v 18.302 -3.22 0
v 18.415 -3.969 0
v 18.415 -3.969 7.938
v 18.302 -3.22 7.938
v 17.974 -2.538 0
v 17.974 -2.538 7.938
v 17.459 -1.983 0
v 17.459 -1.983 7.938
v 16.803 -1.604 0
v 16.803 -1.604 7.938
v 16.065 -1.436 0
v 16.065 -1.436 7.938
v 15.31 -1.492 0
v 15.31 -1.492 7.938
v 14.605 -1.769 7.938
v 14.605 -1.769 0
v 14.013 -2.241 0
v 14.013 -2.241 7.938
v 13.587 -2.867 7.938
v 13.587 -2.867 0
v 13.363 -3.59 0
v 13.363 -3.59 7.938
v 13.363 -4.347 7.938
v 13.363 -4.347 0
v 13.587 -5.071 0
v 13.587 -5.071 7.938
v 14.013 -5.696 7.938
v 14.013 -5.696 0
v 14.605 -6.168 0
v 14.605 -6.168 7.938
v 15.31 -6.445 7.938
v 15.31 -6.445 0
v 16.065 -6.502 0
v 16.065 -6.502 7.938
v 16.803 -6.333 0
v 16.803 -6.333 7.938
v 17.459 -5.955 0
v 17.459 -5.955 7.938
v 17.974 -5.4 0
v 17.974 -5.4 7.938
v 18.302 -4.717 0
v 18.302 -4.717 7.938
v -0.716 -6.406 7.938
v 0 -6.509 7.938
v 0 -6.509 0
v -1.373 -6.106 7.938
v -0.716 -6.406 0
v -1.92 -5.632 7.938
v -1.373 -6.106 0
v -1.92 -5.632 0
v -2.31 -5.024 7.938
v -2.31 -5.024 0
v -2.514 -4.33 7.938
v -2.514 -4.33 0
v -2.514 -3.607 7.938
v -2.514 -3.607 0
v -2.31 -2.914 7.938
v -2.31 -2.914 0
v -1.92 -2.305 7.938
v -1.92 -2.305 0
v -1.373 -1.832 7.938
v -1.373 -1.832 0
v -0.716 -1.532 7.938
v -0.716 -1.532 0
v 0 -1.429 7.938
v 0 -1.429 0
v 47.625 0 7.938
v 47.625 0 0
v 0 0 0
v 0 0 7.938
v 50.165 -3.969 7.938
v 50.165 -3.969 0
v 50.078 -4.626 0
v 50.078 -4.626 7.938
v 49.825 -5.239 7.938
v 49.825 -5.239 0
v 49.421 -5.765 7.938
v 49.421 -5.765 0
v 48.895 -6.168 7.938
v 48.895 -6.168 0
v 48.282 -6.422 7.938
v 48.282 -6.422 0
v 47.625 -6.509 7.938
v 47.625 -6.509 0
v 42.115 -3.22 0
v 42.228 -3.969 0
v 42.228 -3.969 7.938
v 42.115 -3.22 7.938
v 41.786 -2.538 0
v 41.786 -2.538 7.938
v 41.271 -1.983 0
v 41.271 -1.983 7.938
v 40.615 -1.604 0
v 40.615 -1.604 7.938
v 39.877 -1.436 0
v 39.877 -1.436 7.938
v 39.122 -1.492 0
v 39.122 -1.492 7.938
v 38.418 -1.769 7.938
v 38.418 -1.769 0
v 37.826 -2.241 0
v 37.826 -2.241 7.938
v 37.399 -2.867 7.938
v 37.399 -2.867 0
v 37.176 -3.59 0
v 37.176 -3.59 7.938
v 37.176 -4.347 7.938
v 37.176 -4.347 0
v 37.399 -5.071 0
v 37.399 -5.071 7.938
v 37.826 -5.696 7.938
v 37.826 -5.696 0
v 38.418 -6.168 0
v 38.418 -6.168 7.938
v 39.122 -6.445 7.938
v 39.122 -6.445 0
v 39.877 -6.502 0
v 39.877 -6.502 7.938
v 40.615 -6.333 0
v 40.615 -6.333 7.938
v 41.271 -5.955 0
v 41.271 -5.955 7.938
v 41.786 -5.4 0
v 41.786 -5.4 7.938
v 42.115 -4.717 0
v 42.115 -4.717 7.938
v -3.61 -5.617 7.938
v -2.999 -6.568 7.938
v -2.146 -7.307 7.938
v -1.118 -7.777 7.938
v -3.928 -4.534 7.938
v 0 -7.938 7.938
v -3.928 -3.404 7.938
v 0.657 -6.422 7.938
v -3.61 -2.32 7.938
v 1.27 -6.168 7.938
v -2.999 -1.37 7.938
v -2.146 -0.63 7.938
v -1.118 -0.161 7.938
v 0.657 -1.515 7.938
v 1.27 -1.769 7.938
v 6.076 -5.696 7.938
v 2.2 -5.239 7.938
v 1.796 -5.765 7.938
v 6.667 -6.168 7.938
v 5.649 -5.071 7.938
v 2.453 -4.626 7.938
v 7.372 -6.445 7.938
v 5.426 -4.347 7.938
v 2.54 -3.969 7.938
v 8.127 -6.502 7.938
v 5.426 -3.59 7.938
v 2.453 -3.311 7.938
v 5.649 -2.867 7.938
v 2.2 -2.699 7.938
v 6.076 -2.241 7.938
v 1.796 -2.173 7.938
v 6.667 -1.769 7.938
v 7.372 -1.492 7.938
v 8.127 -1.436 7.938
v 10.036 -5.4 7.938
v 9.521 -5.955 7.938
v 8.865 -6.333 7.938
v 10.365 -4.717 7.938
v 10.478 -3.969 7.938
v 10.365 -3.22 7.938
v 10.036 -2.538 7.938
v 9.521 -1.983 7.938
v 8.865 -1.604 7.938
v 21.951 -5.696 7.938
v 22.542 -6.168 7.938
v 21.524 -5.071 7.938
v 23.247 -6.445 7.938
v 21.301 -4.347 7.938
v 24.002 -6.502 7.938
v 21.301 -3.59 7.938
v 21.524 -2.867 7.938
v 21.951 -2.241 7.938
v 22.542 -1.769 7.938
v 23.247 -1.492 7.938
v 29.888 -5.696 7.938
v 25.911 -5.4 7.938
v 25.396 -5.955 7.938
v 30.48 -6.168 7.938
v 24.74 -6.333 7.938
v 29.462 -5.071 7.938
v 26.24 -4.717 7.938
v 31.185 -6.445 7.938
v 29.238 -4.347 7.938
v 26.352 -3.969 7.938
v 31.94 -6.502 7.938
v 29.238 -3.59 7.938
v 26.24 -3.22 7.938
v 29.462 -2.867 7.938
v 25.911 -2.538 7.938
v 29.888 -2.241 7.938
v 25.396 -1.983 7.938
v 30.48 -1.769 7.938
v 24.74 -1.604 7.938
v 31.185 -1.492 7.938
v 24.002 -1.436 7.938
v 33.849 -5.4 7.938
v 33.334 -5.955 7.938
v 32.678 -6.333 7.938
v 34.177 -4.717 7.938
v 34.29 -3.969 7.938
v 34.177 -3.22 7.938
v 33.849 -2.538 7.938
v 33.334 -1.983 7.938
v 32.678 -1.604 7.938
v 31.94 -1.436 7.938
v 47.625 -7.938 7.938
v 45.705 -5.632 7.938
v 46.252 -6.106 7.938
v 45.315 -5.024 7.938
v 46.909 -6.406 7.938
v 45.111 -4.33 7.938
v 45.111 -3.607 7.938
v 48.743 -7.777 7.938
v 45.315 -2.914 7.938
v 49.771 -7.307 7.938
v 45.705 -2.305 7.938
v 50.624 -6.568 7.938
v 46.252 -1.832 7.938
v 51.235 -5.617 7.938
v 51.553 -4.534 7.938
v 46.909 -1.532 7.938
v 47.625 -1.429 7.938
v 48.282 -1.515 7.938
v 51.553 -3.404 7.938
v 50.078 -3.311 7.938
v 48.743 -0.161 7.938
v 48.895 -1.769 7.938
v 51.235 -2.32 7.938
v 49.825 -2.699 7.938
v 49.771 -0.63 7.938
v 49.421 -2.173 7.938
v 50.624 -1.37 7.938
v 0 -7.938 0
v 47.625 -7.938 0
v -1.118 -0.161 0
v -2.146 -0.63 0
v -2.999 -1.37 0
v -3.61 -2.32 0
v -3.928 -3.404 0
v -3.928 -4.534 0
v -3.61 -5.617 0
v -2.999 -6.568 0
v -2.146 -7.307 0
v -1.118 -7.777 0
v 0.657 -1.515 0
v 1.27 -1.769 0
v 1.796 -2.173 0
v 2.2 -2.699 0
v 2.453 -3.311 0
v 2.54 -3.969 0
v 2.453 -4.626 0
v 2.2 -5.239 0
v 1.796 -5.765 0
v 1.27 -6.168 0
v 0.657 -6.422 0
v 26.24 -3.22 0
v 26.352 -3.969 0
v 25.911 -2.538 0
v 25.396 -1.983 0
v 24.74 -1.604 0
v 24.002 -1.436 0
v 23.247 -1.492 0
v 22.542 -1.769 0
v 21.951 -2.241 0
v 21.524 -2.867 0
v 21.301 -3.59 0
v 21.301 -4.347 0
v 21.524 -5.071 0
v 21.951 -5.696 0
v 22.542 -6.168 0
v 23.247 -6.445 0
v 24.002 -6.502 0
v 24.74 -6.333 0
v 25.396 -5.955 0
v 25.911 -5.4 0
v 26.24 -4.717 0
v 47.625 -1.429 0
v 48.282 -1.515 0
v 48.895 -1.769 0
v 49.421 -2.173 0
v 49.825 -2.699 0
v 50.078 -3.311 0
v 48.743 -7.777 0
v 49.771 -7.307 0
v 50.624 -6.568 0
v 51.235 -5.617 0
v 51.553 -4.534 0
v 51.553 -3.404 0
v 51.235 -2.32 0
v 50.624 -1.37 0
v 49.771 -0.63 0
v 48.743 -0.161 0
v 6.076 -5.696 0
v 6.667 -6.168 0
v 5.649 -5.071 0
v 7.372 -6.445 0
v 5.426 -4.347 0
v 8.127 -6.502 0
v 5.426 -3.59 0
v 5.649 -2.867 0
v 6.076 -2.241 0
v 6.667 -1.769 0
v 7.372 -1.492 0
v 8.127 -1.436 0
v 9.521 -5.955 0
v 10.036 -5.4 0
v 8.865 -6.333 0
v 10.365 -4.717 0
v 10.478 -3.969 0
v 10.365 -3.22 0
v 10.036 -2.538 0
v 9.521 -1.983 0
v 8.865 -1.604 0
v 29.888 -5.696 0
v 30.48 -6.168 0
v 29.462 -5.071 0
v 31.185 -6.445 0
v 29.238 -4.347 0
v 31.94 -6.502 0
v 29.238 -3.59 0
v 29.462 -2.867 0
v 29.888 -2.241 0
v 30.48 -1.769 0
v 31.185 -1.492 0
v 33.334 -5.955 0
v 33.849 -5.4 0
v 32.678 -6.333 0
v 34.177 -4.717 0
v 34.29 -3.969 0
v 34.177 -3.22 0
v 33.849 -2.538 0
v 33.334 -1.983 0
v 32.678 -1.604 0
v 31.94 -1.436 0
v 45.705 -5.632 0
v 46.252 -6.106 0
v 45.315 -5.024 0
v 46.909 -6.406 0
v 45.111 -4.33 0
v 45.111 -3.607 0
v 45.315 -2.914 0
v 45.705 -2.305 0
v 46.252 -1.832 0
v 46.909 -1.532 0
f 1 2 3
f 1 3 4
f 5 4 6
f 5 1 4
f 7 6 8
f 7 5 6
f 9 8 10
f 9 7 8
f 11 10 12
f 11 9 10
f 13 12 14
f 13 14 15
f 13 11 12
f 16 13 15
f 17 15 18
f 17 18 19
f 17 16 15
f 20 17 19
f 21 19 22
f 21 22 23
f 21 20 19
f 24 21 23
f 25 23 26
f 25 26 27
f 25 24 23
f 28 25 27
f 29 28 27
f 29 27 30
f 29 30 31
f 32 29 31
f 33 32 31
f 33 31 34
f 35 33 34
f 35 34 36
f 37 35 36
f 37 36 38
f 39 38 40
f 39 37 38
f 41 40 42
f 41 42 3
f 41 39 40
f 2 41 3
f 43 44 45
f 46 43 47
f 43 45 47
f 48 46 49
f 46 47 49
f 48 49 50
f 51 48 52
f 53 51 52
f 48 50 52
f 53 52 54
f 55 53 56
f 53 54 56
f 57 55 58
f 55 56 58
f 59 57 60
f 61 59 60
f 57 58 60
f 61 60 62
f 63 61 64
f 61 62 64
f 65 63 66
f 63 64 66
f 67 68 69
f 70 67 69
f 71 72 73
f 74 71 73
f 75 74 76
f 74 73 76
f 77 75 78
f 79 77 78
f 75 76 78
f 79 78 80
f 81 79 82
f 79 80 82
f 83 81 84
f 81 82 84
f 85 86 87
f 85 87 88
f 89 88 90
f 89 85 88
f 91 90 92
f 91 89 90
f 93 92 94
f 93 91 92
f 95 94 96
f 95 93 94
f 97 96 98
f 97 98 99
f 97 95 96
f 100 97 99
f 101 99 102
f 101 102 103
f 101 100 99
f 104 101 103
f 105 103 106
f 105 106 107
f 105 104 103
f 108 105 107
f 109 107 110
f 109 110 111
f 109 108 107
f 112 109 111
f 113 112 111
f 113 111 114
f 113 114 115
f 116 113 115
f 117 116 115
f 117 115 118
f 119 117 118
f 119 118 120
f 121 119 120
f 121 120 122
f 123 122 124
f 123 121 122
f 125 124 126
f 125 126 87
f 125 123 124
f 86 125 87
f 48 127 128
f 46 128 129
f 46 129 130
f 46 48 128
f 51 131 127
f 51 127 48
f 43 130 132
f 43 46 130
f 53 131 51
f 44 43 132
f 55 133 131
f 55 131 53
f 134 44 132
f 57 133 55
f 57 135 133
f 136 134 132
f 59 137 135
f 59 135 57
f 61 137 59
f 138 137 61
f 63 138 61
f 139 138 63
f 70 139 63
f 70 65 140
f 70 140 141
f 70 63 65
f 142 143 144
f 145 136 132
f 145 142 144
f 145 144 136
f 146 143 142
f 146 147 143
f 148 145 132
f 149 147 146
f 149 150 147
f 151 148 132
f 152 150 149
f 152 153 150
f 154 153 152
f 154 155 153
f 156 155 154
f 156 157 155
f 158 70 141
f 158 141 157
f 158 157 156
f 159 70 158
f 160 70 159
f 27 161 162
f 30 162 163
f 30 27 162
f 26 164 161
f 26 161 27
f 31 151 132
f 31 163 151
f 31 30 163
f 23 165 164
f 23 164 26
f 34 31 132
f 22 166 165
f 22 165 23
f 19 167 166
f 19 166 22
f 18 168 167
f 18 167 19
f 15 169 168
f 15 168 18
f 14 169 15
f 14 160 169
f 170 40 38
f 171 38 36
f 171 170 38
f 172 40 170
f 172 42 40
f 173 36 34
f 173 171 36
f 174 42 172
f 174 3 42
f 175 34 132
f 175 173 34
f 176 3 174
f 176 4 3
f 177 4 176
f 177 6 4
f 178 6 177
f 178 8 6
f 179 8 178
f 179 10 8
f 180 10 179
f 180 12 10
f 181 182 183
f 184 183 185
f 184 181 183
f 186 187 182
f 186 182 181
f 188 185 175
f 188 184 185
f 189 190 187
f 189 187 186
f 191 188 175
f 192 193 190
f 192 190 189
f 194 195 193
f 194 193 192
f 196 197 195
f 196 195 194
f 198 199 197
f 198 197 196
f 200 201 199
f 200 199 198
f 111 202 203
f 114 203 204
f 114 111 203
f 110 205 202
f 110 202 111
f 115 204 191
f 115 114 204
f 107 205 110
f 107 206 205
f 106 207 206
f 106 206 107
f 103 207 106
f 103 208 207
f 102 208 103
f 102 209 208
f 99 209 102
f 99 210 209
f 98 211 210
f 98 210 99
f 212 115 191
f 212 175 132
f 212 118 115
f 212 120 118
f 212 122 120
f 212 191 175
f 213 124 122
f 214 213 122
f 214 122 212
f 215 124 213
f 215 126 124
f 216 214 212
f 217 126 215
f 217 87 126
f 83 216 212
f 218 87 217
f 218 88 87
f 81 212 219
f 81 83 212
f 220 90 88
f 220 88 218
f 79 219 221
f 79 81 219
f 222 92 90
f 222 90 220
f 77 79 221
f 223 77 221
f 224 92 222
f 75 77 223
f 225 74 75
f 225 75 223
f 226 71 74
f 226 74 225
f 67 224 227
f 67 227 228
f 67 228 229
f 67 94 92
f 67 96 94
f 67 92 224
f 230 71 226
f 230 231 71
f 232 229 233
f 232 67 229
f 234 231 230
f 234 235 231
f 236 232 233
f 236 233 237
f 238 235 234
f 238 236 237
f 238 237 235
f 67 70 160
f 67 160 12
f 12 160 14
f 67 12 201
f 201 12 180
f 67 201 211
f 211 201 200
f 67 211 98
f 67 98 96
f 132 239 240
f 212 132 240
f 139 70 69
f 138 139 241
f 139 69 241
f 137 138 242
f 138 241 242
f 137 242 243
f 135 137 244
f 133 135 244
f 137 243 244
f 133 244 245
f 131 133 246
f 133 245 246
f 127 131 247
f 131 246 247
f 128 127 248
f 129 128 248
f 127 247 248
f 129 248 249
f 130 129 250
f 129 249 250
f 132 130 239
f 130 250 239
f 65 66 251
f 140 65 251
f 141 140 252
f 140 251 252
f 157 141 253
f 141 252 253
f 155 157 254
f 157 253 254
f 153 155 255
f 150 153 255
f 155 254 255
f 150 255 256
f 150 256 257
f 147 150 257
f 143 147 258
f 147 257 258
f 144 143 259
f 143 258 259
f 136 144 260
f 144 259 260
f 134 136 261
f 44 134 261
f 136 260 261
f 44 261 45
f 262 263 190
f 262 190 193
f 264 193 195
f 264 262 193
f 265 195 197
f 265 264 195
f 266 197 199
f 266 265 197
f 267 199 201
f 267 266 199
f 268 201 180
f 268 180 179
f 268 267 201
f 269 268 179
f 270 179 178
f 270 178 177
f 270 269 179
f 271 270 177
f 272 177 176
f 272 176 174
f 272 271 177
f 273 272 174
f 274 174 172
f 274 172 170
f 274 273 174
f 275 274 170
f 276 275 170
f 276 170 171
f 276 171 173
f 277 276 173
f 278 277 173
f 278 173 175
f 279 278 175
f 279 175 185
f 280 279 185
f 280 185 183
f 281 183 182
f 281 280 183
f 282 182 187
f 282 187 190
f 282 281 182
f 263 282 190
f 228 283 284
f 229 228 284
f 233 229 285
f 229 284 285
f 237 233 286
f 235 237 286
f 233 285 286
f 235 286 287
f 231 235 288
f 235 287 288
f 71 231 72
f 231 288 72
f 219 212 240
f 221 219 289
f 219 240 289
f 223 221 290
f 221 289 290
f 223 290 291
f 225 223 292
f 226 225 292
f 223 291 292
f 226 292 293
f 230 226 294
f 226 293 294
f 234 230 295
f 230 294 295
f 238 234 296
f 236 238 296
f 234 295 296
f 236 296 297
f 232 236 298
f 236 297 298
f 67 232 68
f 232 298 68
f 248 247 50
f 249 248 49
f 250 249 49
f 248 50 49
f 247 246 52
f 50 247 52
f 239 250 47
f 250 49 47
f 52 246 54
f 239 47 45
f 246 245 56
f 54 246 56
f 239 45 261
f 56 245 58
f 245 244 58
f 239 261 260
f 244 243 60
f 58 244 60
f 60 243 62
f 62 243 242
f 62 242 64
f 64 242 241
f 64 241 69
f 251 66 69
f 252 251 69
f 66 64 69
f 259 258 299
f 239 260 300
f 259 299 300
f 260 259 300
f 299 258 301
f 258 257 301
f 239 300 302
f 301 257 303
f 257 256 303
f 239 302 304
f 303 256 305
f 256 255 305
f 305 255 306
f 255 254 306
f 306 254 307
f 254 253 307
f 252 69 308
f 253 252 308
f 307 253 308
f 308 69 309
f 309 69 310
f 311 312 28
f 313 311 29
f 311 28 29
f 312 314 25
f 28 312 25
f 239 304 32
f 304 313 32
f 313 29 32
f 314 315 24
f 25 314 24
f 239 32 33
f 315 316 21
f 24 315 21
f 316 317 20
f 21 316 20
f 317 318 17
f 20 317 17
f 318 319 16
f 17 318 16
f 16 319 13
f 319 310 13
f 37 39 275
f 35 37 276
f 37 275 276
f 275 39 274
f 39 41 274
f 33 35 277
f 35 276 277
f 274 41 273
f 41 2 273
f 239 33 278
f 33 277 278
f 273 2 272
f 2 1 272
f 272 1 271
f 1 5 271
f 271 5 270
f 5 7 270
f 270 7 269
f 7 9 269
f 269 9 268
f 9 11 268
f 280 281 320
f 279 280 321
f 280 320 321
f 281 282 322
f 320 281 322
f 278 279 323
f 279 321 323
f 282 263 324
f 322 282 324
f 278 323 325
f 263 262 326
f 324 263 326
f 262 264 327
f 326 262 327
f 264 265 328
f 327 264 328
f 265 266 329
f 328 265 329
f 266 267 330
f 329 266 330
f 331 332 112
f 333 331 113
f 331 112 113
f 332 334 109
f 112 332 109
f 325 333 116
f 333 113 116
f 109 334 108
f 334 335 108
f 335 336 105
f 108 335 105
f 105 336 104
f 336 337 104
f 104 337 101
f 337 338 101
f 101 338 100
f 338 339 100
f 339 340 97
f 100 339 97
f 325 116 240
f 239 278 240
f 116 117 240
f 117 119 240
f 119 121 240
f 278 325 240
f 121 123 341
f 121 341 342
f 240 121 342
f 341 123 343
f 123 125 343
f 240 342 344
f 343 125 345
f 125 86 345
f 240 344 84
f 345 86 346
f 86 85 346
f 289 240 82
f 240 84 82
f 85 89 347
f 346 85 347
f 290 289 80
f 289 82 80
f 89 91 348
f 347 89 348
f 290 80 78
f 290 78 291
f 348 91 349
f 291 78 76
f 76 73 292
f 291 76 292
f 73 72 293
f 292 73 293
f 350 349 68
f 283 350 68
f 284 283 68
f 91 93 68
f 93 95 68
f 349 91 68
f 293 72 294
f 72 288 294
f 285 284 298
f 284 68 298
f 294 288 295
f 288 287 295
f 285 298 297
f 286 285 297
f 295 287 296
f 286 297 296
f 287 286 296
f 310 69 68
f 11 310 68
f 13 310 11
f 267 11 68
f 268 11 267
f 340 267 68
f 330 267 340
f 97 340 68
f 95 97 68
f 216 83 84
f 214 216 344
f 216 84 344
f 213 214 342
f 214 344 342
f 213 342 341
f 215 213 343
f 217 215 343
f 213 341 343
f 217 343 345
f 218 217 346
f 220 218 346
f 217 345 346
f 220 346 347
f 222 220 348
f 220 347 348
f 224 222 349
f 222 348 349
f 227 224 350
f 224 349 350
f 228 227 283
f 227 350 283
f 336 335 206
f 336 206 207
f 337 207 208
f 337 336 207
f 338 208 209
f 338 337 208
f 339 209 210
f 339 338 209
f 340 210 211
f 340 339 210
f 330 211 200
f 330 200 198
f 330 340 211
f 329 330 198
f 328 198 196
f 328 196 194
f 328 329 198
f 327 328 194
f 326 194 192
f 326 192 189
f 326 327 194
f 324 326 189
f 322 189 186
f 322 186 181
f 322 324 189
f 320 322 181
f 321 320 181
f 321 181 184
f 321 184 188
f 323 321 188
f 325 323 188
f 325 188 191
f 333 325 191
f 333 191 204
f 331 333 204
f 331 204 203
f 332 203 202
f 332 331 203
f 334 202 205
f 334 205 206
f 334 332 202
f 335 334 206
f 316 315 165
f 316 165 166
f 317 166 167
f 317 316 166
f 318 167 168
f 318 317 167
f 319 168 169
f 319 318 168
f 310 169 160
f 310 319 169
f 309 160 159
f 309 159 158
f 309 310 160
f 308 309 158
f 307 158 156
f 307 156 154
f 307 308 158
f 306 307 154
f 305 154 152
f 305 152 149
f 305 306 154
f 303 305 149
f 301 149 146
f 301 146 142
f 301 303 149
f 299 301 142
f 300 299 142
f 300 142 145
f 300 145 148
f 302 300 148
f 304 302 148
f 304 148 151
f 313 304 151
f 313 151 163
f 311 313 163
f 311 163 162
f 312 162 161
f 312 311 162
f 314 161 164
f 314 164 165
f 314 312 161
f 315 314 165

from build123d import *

# Parameters (mm, degrees)
F0_R     = 2.54
F1_DEPTH = 7.9375


with BuildPart() as f1:
    # F0 (on Top) → F1 (new body)
    with BuildSketch(Plane.XY):
        with BuildLine():
            Line((47.625, 0), (0, 0))
            Line((0, 0), (0, -1.42875))
            ThreePointArc((0, -1.42875), (1.796051, -2.172699), (2.54, -3.96875))
            ThreePointArc((2.54, -3.96875), (1.796051, -5.764801), (0, -6.50875))
            Line((0, -6.50875), (0, -7.9375))
            Line((0, -7.9375), (47.625, -7.9375))
            Line((47.625, -7.9375), (47.625, -6.50875))
            ThreePointArc((47.625, -6.50875), (45.085, -3.96875), (47.625, -1.42875))
            Line((47.625, -1.42875), (47.625, 0))
        make_face()
        with Locations((7.9375, -3.96875)):
            Circle(F0_R, mode=Mode.SUBTRACT)
        with Locations((15.875, -3.96875)):
            Circle(F0_R, mode=Mode.SUBTRACT)
        with Locations((23.8125, -3.96875)):
            Circle(F0_R, mode=Mode.SUBTRACT)
        with Locations((31.75, -3.96875)):
            Circle(F0_R, mode=Mode.SUBTRACT)
        with Locations((39.6875, -3.96875)):
            Circle(F0_R, mode=Mode.SUBTRACT)
        with BuildLine():
            Line((0, -1.42875), (0, 0))
            ThreePointArc((0, 0), (-3.96875, -3.96875), (0, -7.9375))
            Line((0, -7.9375), (0, -6.50875))
            ThreePointArc((0, -6.50875), (-2.54, -3.96875), (0, -1.42875))
        make_face()
        with BuildLine():
            ThreePointArc((47.625, -7.9375), (51.59375, -3.96875), (47.625, 0))
            Line((47.625, 0), (47.625, -1.42875))
            ThreePointArc((47.625, -1.42875), (49.421051, -2.172699), (50.165, -3.96875))
            ThreePointArc((50.165, -3.96875), (49.421051, -5.764801), (47.625, -6.50875))
            Line((47.625, -6.50875), (47.625, -7.9375))
        make_face()
    extrude(amount=F1_DEPTH)


solid = f1.part
